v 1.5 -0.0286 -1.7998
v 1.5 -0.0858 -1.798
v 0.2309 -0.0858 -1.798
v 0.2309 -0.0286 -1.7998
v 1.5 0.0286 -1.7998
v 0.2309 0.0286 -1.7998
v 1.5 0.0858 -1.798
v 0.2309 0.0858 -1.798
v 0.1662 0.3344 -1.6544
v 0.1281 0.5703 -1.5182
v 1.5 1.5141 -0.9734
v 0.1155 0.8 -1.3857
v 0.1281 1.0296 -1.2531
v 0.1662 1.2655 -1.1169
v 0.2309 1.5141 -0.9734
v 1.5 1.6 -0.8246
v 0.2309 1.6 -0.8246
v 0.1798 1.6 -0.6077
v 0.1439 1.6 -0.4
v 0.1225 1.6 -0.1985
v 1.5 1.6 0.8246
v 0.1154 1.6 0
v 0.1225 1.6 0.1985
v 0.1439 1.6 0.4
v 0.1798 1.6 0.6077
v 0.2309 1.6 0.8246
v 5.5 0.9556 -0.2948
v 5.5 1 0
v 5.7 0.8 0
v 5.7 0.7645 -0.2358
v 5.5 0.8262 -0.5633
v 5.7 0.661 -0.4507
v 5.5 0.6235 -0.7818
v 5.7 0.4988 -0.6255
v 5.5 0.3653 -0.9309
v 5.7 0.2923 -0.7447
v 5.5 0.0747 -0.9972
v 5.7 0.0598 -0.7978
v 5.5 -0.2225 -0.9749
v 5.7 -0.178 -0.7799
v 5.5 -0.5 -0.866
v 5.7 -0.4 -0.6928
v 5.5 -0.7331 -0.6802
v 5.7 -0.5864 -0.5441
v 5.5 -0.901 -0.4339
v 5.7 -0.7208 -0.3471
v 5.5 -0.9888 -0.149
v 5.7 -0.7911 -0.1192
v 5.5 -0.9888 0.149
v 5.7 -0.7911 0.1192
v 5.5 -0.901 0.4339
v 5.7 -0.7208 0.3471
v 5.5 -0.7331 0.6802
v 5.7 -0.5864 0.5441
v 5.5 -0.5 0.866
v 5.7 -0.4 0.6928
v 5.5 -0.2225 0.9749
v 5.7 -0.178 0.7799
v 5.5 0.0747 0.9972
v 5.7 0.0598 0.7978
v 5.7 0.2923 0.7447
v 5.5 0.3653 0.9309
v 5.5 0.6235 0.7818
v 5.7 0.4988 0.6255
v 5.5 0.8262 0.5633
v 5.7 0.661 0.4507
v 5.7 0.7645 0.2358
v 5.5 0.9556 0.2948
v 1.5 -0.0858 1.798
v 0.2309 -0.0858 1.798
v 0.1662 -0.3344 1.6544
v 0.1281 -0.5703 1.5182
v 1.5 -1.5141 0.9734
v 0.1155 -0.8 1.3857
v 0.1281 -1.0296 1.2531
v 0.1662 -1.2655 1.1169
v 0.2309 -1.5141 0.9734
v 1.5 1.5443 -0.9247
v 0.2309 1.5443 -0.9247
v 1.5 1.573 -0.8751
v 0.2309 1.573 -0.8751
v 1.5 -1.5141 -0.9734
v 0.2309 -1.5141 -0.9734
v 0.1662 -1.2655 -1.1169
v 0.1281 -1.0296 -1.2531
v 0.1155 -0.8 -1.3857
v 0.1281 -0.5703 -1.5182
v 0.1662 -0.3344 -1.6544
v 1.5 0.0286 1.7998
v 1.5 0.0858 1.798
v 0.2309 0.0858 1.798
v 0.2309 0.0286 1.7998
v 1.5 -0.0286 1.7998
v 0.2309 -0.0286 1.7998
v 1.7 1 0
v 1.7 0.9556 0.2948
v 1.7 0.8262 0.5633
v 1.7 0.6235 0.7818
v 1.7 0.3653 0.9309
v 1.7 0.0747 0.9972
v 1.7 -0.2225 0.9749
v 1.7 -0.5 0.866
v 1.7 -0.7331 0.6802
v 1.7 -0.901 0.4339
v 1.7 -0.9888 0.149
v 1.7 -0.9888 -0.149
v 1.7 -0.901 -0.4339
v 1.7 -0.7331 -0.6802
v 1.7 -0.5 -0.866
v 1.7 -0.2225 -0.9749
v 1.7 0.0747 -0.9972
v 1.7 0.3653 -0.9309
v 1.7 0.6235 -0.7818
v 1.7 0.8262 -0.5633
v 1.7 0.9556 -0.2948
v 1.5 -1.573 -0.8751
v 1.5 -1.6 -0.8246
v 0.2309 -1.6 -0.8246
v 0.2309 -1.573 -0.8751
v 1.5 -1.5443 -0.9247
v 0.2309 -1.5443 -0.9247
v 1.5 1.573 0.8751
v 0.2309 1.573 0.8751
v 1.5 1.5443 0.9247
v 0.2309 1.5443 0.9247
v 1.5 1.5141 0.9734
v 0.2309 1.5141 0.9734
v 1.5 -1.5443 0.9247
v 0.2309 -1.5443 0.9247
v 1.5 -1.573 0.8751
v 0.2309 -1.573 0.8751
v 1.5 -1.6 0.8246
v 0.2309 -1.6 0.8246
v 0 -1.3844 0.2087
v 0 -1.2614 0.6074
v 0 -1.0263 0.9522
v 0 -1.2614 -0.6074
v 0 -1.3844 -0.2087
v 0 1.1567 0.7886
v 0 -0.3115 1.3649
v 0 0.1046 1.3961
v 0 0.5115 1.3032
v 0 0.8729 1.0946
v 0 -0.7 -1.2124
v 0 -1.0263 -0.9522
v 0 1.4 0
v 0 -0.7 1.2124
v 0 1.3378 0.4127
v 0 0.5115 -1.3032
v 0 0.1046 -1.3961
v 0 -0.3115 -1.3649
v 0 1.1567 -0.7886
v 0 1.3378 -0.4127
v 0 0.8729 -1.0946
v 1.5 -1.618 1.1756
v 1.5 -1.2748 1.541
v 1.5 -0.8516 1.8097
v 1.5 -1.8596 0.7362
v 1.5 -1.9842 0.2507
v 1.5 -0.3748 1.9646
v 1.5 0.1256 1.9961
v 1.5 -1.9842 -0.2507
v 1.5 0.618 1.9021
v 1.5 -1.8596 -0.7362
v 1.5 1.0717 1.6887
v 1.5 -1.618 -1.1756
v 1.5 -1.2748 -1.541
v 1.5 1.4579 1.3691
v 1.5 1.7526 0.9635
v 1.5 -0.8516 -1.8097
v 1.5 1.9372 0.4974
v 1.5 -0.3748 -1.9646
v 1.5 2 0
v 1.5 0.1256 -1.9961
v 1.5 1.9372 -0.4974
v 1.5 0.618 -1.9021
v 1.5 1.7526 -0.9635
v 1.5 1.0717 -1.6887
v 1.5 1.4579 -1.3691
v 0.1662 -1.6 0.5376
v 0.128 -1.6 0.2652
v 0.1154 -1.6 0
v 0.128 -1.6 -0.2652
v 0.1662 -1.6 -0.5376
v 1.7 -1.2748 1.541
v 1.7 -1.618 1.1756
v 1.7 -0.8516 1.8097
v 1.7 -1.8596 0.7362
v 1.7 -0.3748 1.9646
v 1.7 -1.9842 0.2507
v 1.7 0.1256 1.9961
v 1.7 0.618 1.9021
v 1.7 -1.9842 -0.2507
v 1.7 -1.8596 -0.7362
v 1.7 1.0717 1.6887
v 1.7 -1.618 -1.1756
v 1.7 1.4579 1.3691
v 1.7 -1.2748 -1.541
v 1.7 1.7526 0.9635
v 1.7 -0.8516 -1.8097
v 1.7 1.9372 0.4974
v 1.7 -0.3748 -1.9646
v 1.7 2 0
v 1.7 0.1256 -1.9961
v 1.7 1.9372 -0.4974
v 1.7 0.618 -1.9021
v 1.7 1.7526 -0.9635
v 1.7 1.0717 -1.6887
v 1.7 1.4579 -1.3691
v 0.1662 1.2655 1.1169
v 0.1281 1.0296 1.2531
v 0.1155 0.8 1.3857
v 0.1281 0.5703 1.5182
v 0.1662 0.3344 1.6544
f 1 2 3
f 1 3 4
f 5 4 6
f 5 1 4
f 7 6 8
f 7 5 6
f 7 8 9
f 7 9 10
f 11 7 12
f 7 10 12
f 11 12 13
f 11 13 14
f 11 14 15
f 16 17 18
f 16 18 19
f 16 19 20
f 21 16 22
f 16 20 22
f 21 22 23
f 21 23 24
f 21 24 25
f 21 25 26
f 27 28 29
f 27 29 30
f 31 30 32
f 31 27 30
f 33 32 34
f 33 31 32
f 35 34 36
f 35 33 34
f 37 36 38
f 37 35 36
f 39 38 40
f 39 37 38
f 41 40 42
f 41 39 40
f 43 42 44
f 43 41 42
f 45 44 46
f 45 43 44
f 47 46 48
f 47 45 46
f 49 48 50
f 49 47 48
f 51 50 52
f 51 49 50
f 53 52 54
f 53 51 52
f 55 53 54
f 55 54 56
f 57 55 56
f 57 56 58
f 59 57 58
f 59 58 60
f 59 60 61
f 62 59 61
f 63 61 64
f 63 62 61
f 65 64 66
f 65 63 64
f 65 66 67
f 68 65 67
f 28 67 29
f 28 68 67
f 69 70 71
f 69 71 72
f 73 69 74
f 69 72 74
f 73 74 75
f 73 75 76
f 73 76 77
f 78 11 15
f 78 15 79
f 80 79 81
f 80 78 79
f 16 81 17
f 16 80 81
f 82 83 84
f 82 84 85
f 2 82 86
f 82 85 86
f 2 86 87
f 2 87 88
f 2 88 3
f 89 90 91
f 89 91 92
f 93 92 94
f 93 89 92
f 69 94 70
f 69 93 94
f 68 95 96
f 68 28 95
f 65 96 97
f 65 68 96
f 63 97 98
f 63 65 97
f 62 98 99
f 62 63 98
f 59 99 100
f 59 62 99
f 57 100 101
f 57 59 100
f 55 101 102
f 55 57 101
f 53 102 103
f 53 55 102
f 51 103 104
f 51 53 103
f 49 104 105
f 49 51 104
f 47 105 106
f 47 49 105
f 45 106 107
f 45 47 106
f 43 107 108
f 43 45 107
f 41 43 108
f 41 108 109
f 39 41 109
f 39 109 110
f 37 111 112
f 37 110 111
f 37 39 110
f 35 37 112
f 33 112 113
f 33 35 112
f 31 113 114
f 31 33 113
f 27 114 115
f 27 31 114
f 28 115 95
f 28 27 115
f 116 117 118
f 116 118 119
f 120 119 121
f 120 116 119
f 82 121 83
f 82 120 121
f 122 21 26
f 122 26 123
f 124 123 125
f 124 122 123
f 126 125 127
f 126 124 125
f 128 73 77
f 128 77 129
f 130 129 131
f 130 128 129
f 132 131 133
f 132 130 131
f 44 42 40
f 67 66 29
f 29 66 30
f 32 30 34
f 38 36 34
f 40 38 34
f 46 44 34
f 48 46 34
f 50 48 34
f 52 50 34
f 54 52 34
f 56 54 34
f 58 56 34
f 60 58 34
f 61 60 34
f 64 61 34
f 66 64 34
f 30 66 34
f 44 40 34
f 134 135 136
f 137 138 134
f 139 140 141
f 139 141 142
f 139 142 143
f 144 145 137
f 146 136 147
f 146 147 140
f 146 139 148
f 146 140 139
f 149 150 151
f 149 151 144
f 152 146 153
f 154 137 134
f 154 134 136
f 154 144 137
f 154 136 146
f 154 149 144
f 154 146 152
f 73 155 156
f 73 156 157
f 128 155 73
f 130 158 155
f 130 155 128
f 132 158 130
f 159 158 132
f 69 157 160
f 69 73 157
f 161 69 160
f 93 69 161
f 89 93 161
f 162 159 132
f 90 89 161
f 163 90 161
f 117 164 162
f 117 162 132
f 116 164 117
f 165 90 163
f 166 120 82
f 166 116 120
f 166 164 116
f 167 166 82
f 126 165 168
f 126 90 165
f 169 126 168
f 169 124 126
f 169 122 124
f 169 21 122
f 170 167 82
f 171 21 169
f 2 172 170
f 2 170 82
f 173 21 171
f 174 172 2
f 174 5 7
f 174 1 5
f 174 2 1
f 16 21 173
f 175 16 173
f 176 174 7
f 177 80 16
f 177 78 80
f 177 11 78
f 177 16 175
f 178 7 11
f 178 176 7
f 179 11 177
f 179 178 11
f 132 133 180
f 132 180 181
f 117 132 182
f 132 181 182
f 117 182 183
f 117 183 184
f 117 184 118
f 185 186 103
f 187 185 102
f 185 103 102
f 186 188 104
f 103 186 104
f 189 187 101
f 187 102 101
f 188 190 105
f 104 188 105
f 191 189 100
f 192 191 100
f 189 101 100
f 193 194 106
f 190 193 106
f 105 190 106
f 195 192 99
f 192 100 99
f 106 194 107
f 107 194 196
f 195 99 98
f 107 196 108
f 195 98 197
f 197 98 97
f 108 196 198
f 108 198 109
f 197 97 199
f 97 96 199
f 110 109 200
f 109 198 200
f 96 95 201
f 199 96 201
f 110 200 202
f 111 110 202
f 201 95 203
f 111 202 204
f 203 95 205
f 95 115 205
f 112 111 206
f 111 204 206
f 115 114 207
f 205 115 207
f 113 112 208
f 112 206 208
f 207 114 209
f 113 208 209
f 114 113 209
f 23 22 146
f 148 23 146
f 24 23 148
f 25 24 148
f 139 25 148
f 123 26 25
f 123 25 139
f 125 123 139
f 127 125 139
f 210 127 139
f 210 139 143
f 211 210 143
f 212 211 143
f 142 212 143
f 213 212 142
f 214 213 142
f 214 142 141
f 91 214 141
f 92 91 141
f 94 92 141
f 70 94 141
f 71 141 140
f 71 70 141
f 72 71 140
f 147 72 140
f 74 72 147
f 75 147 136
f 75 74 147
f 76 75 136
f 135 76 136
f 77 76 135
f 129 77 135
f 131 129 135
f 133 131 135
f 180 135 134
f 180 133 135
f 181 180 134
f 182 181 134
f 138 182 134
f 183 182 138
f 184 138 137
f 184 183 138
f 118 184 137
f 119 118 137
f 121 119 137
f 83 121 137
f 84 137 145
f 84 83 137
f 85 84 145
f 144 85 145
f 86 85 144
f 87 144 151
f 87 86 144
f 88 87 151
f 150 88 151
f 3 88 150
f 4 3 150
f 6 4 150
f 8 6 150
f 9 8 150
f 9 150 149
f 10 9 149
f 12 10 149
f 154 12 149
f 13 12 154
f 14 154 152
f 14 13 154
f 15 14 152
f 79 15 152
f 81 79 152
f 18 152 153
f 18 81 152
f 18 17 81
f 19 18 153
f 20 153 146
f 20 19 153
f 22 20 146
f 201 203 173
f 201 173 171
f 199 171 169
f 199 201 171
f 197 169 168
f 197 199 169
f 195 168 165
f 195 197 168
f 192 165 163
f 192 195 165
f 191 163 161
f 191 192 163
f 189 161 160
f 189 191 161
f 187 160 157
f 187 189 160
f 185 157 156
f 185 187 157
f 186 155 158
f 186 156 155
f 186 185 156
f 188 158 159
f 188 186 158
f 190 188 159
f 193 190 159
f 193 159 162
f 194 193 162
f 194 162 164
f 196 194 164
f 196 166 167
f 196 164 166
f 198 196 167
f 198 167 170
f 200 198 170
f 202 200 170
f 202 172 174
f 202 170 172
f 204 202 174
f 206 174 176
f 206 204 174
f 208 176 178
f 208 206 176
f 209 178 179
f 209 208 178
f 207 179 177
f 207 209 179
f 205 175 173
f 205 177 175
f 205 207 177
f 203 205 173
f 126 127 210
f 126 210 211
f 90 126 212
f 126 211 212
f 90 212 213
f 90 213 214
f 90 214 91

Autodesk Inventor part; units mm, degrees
ref_plane "YZ Plane" through (0, 0, 0) normal (1, 0, 0) x (0, 1, 0)
ref_plane "XZ Plane" through (0, 0, 0) normal (0, 1, 0) x (-1, 0, 0)
ref_plane "XY Plane" through (0, 0, 0) normal (0, 0, 1) x (1, 0, 0)
sketch "Sketch15" plane through (0, 0, 0) normal (0, 0, 1) x (1, 0, 0)
  line L0 (0, 0) -> (0, 1.4)
  line L1 (0.2309, 1.8) -> (1.5, 1.8)
  line L2 (1.5, 1.8) -> (1.5, 2)
  line L3 (1.5, 2) -> (1.7, 2)
  line L4 (1.7, 2) -> (1.7, 1)
  line L5 (1.7, 1) -> (5.7, 1)
  line L6 (5.7, 0) -> (0, 0)
  line L7 (0.2309, 1.8) -> (0, 1.4)
  line L8 (5.7, 1) -> (5.7, 0)
  point P0 (6.0083, 0)
  dimension "d78" = 0.2
  dimension "d84" = 1
  dimension "d86" = 0.4
  dimension "d87" = 1.8
  dimension "d89" = 1.5
  dimension "d90" = 2
  dimension "d111" = 4
revolve "Revolution1" add sketch "Sketch15" angle 360 about axis through (5.7, 0, 0) along (-1, 0, 0)
chamfer "Chamfer4" distance 0.2 angle 45 1 edges at (5.7, -1, 0)
sketch "Sketch16" plane through (0, 0, 0) normal (-1, 0, 0) x (0, 0, 1)
  circle A0 centre (0, 0) radius 1.4 projected
  line L0 (0.9238, 1.6) -> (1.8475, 0)
  line L1 (1.8475, 0) -> (0.9238, -1.6)
  line L2 (0.9238, -1.6) -> (-0.9238, -1.6)
  line L3 (-0.9238, -1.6) -> (-1.8475, 0)
  line L4 (-1.8475, 0) -> (-0.9238, 1.6)
  line L5 (-0.9238, 1.6) -> (0.9238, 1.6)
  circle A1 centre (0, 0) radius 2.6573
  dimension "d104" = 3.2
extrude "Extrusion15" cut sketch "Sketch16" against normal up to surface (1.5 mm away) contours A1
thread "Thread3" size "M2x0.4" class "6g" standard "ANSI Metric M Profile" length 3
properties part number "Bolt2b"
